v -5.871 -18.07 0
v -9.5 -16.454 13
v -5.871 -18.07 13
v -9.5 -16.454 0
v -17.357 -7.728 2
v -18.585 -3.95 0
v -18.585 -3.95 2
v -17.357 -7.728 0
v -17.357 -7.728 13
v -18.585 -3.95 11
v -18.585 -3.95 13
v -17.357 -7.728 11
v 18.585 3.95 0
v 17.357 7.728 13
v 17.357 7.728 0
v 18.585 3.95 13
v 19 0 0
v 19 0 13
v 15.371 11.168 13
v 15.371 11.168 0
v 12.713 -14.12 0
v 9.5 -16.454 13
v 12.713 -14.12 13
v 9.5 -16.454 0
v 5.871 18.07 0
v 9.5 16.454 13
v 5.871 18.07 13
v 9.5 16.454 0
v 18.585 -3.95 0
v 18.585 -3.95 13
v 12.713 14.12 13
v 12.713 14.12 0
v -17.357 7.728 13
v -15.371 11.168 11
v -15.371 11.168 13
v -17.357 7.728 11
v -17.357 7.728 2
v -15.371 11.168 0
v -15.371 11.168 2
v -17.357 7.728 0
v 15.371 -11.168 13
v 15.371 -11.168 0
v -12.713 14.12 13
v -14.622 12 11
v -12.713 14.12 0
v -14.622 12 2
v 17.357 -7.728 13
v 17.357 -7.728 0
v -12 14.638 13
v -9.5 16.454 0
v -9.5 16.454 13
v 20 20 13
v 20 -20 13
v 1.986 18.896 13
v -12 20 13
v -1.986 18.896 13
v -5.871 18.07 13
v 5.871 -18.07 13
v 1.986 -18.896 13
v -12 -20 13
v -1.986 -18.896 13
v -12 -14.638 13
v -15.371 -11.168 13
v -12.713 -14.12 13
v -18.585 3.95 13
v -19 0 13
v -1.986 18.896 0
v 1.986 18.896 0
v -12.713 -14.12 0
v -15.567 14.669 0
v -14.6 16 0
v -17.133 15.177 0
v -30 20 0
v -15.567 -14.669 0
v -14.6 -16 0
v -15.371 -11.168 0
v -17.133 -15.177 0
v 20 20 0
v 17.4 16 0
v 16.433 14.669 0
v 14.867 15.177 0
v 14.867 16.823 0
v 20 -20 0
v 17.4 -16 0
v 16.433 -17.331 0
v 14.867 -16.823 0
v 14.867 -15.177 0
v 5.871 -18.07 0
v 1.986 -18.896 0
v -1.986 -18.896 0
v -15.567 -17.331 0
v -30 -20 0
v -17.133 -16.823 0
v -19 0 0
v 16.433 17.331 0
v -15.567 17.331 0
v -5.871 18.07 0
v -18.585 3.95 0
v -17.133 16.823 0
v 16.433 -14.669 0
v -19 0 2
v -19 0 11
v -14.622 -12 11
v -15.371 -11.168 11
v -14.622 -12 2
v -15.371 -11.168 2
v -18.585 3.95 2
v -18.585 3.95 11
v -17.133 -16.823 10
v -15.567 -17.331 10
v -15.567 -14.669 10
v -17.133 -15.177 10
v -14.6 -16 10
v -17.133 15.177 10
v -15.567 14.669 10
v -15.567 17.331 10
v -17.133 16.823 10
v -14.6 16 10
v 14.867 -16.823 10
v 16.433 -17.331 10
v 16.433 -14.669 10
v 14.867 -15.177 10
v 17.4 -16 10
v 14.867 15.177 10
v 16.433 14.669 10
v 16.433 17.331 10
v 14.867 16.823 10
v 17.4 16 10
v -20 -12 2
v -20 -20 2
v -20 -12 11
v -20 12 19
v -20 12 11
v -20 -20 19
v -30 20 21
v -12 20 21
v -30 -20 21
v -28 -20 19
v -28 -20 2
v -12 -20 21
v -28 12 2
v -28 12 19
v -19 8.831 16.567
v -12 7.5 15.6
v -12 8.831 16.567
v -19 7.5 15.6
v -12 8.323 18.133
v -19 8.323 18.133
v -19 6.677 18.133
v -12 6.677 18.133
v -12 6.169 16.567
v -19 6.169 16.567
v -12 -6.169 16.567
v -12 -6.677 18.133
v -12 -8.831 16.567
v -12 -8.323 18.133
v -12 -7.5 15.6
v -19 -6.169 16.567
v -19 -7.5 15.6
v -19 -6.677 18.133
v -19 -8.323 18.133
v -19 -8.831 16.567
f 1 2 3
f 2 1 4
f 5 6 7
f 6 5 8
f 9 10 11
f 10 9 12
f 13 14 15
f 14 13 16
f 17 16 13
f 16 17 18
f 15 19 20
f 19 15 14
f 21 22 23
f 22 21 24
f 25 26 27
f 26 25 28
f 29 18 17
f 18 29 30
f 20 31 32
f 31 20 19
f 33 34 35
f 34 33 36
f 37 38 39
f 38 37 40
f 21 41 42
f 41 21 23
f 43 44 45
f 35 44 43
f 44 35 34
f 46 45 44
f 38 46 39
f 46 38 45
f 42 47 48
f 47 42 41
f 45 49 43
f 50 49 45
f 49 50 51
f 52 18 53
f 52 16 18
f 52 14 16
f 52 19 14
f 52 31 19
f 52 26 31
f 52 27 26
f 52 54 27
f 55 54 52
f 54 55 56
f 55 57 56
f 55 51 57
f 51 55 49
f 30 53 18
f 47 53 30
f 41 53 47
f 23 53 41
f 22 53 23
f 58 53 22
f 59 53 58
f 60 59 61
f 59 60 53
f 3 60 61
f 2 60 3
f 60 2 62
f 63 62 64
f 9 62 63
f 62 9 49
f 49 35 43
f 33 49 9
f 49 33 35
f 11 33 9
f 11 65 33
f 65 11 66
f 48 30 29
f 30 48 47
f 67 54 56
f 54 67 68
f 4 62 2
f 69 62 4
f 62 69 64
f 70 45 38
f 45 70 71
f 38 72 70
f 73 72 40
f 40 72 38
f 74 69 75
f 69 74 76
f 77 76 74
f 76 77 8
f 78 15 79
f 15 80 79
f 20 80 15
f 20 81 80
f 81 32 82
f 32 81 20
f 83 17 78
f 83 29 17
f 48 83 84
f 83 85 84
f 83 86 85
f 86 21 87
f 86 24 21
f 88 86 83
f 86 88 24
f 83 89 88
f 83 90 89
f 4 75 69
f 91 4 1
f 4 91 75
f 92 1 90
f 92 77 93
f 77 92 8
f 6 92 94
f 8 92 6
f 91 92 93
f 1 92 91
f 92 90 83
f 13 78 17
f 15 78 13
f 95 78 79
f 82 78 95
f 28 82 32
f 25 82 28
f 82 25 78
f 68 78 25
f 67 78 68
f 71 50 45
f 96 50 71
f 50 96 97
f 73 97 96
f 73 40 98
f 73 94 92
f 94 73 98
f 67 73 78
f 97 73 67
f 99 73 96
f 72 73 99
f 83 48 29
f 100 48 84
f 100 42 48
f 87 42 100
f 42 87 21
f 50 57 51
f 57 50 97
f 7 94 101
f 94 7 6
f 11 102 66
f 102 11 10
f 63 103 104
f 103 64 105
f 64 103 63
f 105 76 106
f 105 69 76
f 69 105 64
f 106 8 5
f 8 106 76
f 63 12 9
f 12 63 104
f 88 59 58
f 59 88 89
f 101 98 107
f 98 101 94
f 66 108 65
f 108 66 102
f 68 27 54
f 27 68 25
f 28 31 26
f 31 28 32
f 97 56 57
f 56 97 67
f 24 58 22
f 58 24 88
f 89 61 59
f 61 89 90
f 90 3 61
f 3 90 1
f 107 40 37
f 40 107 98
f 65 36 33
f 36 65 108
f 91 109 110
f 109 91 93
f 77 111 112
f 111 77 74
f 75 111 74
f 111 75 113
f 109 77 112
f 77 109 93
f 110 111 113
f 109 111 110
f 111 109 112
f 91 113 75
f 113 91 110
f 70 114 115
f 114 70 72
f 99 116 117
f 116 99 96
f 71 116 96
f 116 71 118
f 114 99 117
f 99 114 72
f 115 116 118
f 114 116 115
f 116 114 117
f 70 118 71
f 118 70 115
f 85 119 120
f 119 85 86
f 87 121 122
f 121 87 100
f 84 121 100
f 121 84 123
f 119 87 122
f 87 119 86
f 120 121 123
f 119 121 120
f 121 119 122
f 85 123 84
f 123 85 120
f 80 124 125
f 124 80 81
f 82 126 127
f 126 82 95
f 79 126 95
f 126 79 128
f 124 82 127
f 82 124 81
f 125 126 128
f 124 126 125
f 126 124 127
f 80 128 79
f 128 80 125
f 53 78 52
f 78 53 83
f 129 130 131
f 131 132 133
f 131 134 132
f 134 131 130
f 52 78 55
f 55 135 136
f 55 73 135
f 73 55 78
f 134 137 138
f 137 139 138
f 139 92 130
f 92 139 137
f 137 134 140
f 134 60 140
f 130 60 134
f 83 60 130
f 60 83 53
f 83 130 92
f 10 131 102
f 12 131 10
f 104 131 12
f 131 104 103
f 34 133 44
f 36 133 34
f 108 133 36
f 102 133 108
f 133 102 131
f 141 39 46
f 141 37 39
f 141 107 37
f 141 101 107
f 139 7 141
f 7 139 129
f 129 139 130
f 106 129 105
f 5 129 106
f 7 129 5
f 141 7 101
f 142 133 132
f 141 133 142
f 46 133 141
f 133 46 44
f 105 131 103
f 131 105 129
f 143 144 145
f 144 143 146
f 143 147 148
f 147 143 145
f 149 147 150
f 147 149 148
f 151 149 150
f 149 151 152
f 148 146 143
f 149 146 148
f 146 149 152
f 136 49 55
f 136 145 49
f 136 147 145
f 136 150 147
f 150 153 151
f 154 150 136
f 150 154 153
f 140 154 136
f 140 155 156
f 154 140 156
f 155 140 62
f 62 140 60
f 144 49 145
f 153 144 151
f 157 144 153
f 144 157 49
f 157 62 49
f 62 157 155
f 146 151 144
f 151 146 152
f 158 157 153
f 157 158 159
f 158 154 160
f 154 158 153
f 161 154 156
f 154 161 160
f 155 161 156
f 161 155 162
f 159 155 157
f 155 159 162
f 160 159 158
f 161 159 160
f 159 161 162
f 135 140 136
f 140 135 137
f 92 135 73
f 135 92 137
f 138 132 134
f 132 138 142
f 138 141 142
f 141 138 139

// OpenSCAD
srewDiam = 2.8; // diameter in mm
union()
{  
  // fan mounting base
  difference()
  {
    translate([-20,-20,0])cube([40, 40, 13]); 
    union()
      {
	  cylinder(r=19, h=13);
	  // screwholes
        translate([-16,-16,0])cylinder(r=1.4,h=10);
	  translate([-16,16,0])cylinder(r=1.4,h=10);
	  translate([16,-16,0])cylinder(r=1.4,h=10);
	  translate([16,16,0])cylinder(r=1.4,h=10);
	}
  translate([-20,-12,2])cube([10,24,9]);
  }
  // x-carriage mount plate
  difference() 
  {
    translate([-20,-20,13])cube([8,40,8]);
    union()
    {
      // screwholes
      translate([-19,7.5,17])rotate([0,90,0])cylinder(r=1.4,h=7);
      translate([-19,-7.5,17])rotate([0,90,0])cylinder(r=1.4,h=7);
    }
  }
  // air duct
  difference()
  {
    translate([-30,-20,0])cube([10,40,21]);
    translate([-28,-20,2])cube([8,32,17]);
  }
  
}
